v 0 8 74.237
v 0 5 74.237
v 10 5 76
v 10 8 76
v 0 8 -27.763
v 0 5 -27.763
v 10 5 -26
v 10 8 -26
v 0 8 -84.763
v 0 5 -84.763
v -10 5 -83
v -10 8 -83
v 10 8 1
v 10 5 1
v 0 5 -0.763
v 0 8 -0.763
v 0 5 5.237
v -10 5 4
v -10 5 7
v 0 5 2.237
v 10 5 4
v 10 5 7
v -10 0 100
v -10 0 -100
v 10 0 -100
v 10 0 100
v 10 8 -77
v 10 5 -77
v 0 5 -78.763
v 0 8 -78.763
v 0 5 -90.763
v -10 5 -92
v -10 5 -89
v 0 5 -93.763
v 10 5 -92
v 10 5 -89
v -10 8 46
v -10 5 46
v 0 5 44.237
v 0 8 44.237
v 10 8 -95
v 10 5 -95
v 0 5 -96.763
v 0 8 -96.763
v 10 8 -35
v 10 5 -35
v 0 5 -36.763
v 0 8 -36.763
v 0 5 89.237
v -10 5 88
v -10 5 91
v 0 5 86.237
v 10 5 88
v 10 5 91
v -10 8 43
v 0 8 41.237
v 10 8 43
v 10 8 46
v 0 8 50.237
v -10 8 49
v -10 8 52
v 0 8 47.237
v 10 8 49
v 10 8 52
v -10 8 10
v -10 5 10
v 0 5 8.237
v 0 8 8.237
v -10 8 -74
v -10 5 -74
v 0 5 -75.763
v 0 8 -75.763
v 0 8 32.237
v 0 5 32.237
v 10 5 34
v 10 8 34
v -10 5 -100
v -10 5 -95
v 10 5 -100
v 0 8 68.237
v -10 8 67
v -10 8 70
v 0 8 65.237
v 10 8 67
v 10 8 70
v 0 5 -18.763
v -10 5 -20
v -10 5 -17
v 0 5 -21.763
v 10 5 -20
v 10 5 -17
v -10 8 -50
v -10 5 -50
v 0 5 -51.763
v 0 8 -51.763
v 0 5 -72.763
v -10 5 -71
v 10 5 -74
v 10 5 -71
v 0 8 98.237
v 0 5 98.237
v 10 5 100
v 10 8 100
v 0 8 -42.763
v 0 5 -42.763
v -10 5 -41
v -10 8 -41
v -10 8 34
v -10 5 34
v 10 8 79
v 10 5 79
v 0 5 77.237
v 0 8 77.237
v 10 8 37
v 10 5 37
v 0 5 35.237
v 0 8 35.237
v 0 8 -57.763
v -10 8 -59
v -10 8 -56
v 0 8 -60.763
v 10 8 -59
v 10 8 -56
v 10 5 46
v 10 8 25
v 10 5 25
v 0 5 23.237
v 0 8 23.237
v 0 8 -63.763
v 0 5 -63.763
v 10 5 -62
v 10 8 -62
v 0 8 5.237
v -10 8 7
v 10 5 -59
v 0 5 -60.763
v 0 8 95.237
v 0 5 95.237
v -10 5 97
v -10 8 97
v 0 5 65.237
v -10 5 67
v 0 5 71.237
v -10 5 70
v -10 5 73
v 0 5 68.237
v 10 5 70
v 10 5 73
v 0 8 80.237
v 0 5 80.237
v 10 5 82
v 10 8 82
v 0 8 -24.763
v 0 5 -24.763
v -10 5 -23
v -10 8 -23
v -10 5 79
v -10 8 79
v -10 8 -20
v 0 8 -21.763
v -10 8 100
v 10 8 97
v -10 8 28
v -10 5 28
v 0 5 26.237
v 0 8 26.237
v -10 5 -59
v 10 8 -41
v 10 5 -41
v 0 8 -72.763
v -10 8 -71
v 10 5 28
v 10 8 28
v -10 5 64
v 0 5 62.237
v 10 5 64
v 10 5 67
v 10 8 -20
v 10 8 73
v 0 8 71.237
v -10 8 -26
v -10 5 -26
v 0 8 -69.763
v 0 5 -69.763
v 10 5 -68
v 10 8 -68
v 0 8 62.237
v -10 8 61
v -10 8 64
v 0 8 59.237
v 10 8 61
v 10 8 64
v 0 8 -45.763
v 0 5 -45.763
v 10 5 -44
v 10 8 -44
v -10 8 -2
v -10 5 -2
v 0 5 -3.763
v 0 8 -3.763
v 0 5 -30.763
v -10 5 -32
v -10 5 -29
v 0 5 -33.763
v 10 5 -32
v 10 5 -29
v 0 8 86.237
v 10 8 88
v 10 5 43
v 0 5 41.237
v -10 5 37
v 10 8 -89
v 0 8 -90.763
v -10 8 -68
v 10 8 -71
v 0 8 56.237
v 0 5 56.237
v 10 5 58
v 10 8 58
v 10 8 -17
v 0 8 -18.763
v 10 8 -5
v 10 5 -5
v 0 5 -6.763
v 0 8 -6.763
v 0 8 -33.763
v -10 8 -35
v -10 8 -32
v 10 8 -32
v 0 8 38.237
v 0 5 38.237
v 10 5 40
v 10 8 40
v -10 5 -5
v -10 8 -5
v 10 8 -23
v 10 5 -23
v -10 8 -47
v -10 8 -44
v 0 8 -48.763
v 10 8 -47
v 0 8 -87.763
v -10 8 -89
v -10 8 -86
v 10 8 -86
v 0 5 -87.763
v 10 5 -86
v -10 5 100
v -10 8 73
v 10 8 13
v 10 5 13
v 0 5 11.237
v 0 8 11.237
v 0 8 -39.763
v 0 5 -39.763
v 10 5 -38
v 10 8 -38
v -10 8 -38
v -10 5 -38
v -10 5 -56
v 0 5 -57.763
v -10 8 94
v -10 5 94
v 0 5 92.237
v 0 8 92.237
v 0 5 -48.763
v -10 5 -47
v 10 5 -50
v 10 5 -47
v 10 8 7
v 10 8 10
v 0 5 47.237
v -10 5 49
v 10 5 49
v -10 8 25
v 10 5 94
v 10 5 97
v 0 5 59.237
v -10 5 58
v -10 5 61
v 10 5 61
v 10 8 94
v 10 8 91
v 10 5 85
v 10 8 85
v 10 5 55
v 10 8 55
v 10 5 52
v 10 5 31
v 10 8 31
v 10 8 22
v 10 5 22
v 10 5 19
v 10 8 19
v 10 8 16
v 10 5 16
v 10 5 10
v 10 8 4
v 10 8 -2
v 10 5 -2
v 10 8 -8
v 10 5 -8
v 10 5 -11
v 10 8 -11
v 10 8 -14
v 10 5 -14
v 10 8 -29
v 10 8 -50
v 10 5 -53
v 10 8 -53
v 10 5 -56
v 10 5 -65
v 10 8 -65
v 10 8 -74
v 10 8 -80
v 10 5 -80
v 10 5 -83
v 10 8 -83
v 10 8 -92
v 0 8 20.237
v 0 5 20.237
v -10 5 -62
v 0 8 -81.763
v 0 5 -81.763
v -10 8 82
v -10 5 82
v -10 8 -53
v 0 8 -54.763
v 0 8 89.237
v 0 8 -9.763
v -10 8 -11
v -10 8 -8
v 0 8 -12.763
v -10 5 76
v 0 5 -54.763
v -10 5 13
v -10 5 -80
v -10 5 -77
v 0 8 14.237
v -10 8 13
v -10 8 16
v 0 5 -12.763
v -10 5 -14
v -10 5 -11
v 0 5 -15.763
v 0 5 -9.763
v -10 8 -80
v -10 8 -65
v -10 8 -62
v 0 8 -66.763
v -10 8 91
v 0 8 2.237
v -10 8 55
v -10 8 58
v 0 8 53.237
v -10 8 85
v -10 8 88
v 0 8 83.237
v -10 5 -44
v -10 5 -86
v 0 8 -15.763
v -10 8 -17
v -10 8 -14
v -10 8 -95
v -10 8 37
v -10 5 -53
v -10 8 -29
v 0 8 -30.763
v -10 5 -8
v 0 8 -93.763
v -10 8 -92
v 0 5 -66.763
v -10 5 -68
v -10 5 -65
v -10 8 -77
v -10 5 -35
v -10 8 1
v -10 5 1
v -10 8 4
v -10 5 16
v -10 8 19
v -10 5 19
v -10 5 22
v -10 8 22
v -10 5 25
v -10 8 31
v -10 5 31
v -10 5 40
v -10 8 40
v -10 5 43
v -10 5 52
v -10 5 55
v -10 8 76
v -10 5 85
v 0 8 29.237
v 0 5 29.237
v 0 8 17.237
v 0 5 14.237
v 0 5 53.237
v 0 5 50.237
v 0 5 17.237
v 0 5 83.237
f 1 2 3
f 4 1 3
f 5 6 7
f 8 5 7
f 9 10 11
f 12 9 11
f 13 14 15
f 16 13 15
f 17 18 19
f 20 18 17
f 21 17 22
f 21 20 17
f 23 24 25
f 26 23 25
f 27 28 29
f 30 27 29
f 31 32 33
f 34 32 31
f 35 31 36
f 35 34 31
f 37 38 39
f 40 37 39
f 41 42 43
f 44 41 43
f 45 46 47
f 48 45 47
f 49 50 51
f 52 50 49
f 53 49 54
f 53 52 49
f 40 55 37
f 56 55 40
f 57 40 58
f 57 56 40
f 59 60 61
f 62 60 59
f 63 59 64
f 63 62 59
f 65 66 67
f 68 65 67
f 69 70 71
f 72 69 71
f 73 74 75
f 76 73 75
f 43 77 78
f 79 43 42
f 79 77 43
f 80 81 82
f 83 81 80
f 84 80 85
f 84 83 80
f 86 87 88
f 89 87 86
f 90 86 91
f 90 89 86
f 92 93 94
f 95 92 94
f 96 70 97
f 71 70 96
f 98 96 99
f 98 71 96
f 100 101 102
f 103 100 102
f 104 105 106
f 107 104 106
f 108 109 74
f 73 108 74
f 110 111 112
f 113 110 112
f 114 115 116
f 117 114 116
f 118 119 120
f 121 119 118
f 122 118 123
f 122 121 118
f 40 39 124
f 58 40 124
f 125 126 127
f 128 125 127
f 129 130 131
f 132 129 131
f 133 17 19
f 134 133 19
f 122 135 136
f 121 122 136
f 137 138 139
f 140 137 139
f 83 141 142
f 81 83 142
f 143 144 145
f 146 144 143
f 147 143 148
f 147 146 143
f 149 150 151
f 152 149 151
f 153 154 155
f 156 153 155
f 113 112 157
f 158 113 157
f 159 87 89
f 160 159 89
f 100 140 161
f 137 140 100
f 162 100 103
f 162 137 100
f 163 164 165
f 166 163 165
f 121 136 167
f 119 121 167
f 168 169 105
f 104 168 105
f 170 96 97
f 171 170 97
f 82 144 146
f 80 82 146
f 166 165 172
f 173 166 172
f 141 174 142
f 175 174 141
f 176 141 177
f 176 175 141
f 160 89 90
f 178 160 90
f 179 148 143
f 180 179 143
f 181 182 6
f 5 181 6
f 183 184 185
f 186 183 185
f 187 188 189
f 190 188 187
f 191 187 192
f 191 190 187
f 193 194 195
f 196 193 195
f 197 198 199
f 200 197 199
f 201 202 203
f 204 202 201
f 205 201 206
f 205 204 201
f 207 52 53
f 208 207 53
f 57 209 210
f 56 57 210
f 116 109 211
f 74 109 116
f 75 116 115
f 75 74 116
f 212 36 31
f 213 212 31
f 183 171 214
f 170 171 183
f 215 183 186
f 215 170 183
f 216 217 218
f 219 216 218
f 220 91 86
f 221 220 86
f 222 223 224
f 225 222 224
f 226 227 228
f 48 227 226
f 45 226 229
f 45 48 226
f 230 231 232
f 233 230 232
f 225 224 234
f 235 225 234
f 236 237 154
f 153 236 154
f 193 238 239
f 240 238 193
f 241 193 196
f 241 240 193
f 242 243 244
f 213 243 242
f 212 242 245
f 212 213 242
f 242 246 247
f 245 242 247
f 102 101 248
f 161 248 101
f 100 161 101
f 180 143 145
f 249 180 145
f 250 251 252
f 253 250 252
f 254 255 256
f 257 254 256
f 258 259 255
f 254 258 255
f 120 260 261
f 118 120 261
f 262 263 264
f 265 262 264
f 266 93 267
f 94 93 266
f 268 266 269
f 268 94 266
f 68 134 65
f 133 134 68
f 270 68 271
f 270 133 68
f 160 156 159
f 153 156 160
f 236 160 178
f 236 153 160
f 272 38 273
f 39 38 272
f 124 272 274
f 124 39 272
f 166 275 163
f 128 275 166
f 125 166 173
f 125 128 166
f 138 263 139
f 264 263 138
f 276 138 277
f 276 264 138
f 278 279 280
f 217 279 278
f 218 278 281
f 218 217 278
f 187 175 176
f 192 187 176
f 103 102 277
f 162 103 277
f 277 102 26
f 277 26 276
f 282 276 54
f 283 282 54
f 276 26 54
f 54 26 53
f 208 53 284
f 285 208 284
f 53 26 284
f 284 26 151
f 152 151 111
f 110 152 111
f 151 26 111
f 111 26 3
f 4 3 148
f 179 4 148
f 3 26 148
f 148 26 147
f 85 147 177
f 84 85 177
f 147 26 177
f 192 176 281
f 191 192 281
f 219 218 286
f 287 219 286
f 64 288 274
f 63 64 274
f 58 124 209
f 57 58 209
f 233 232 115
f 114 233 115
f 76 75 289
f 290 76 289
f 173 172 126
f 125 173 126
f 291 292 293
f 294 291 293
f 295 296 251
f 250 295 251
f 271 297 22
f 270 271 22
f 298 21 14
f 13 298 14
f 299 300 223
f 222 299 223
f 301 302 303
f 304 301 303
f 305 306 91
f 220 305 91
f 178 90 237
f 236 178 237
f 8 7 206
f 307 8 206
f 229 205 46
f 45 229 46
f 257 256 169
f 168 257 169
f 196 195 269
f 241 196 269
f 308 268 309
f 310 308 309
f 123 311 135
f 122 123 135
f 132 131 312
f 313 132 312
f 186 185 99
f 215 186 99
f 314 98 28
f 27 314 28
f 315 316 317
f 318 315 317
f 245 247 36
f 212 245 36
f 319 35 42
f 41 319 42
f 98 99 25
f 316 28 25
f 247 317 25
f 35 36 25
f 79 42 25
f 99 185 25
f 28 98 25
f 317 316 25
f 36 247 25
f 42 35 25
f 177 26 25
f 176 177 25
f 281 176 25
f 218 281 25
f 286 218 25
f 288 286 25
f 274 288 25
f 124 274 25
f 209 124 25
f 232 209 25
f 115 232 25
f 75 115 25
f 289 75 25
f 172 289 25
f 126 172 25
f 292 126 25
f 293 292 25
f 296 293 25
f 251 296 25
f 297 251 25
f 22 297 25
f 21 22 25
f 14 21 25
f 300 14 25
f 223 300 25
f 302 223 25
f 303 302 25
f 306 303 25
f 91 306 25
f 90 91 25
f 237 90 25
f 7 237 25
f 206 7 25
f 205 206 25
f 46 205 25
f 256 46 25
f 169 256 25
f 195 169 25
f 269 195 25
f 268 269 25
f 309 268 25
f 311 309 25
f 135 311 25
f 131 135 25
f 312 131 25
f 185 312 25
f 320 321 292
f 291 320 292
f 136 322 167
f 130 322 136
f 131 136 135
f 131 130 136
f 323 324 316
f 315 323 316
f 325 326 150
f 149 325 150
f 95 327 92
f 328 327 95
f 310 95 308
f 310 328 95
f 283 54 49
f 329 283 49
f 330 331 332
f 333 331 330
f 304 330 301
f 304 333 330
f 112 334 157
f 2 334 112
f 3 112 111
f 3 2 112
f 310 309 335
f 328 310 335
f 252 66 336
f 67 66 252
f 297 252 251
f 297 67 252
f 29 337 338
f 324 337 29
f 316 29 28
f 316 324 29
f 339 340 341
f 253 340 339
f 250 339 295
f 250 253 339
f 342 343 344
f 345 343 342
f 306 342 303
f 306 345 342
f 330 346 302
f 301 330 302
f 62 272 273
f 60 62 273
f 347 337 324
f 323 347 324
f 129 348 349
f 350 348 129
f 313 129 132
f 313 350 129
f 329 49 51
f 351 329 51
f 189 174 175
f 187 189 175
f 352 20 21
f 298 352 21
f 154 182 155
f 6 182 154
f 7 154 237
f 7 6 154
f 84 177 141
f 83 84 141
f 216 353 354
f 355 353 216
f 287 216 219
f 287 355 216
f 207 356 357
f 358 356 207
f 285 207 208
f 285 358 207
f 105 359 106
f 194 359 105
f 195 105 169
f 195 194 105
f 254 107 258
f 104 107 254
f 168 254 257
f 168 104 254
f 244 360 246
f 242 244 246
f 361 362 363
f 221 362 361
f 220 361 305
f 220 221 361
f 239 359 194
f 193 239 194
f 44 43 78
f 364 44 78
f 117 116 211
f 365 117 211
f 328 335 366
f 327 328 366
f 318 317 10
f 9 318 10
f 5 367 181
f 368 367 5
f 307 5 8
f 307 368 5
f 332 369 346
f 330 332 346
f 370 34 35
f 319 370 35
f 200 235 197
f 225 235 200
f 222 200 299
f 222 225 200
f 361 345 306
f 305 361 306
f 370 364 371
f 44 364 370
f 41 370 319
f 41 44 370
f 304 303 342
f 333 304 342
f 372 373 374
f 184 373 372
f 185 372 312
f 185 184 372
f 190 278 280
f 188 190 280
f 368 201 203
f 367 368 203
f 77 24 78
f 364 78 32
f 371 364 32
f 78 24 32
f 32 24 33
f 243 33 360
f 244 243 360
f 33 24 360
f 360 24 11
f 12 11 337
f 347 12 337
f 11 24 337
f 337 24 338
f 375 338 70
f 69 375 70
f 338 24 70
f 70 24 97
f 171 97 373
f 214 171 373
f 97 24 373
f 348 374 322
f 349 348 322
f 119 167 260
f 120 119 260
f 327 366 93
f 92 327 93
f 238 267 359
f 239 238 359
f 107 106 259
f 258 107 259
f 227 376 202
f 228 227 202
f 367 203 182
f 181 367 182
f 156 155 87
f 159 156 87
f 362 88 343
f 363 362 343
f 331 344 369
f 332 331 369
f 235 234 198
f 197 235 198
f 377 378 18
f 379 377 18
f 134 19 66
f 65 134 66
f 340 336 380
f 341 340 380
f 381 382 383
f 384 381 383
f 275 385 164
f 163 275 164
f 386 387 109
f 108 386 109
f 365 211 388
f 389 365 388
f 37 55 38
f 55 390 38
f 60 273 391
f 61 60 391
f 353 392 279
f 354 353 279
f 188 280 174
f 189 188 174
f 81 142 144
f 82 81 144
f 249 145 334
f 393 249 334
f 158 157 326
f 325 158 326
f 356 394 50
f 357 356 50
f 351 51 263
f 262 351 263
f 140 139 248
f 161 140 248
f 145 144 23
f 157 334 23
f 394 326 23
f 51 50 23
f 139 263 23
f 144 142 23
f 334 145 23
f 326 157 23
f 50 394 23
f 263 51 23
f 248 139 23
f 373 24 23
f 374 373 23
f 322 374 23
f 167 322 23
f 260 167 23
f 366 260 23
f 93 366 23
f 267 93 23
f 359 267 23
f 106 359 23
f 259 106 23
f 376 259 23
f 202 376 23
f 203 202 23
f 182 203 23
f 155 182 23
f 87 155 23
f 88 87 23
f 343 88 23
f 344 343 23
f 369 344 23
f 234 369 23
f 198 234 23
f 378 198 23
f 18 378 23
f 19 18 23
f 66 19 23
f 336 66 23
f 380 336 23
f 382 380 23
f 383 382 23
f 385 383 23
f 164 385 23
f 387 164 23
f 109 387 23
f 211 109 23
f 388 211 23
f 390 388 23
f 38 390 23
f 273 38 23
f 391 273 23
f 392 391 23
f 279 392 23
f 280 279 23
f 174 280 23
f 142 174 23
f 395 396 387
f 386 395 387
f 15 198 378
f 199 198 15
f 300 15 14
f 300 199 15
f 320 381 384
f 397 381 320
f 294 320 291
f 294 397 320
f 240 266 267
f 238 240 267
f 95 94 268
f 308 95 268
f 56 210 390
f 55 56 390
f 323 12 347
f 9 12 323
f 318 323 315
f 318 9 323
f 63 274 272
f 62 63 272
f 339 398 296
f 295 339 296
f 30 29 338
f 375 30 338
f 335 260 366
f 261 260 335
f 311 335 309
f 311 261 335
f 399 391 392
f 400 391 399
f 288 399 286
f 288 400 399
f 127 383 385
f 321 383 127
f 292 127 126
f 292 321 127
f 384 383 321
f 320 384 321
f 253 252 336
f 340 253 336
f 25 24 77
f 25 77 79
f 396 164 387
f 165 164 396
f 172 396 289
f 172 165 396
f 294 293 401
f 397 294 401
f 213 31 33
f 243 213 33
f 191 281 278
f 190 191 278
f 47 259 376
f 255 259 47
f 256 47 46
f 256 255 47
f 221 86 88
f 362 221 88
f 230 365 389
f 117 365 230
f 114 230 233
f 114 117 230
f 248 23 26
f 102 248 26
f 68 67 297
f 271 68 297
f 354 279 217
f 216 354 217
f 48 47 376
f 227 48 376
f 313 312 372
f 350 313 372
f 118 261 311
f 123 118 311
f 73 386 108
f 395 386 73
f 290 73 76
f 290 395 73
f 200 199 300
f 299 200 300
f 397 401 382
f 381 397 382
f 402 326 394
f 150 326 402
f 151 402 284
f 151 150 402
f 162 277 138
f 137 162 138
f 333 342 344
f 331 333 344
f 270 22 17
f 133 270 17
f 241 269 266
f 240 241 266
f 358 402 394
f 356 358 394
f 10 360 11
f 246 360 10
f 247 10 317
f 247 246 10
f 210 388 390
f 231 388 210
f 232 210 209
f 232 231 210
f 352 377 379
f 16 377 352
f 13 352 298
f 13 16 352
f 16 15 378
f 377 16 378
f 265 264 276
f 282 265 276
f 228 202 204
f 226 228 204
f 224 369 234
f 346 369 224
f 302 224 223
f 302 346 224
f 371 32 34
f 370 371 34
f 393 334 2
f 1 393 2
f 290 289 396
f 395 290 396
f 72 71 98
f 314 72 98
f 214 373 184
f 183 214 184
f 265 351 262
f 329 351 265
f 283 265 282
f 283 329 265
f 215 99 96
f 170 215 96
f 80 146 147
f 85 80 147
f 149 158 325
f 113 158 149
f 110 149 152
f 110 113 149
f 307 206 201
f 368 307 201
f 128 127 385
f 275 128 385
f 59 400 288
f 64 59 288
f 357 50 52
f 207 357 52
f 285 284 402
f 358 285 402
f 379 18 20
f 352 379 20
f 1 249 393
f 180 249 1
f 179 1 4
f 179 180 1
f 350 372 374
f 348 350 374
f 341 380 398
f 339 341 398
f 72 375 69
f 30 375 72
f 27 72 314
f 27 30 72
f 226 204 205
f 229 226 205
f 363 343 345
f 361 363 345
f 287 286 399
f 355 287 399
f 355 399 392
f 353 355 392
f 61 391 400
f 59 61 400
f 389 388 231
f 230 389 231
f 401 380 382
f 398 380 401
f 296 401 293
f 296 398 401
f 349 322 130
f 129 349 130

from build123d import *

# Parameters (mm, degrees)
SKETCH2_W           = 20
SKETCH2_H           = 200
BOSS_EXTRUDE1_DEPTH = 5
BOSS_EXTRUDE2_DEPTH = 3
LPATTERN1_COUNT     = 33
LPATTERN1_PITCH     = 6


with BuildPart() as part:
    # Sketch2 → Boss-Extrude1 (new body)
    with BuildSketch(Plane(origin=(0, 0, 0), x_dir=(1, 0, 0), z_dir=(0, 1, 0))):
        Rectangle(SKETCH2_W, SKETCH2_H)
    extrude(amount=BOSS_EXTRUDE1_DEPTH)

    # Sketch3 → Boss-Extrude2 (add)
    with BuildSketch(Plane(origin=(0, 5, 0), x_dir=(1, 0, 0), z_dir=(0, 1, 0))):
        Polygon((-10, -100), (0, -98.236730193), (10, -100), (10, -97), (0, -95.236730193), (-10, -97), align=None)
    boss_extrude2 = extrude(amount=BOSS_EXTRUDE2_DEPTH)

    # LPattern1: Boss-Extrude2 ×33
    with Locations(*[(0, 0, -i * LPATTERN1_PITCH) for i in range(1, LPATTERN1_COUNT)]):
        add(boss_extrude2)


solid = part.part
